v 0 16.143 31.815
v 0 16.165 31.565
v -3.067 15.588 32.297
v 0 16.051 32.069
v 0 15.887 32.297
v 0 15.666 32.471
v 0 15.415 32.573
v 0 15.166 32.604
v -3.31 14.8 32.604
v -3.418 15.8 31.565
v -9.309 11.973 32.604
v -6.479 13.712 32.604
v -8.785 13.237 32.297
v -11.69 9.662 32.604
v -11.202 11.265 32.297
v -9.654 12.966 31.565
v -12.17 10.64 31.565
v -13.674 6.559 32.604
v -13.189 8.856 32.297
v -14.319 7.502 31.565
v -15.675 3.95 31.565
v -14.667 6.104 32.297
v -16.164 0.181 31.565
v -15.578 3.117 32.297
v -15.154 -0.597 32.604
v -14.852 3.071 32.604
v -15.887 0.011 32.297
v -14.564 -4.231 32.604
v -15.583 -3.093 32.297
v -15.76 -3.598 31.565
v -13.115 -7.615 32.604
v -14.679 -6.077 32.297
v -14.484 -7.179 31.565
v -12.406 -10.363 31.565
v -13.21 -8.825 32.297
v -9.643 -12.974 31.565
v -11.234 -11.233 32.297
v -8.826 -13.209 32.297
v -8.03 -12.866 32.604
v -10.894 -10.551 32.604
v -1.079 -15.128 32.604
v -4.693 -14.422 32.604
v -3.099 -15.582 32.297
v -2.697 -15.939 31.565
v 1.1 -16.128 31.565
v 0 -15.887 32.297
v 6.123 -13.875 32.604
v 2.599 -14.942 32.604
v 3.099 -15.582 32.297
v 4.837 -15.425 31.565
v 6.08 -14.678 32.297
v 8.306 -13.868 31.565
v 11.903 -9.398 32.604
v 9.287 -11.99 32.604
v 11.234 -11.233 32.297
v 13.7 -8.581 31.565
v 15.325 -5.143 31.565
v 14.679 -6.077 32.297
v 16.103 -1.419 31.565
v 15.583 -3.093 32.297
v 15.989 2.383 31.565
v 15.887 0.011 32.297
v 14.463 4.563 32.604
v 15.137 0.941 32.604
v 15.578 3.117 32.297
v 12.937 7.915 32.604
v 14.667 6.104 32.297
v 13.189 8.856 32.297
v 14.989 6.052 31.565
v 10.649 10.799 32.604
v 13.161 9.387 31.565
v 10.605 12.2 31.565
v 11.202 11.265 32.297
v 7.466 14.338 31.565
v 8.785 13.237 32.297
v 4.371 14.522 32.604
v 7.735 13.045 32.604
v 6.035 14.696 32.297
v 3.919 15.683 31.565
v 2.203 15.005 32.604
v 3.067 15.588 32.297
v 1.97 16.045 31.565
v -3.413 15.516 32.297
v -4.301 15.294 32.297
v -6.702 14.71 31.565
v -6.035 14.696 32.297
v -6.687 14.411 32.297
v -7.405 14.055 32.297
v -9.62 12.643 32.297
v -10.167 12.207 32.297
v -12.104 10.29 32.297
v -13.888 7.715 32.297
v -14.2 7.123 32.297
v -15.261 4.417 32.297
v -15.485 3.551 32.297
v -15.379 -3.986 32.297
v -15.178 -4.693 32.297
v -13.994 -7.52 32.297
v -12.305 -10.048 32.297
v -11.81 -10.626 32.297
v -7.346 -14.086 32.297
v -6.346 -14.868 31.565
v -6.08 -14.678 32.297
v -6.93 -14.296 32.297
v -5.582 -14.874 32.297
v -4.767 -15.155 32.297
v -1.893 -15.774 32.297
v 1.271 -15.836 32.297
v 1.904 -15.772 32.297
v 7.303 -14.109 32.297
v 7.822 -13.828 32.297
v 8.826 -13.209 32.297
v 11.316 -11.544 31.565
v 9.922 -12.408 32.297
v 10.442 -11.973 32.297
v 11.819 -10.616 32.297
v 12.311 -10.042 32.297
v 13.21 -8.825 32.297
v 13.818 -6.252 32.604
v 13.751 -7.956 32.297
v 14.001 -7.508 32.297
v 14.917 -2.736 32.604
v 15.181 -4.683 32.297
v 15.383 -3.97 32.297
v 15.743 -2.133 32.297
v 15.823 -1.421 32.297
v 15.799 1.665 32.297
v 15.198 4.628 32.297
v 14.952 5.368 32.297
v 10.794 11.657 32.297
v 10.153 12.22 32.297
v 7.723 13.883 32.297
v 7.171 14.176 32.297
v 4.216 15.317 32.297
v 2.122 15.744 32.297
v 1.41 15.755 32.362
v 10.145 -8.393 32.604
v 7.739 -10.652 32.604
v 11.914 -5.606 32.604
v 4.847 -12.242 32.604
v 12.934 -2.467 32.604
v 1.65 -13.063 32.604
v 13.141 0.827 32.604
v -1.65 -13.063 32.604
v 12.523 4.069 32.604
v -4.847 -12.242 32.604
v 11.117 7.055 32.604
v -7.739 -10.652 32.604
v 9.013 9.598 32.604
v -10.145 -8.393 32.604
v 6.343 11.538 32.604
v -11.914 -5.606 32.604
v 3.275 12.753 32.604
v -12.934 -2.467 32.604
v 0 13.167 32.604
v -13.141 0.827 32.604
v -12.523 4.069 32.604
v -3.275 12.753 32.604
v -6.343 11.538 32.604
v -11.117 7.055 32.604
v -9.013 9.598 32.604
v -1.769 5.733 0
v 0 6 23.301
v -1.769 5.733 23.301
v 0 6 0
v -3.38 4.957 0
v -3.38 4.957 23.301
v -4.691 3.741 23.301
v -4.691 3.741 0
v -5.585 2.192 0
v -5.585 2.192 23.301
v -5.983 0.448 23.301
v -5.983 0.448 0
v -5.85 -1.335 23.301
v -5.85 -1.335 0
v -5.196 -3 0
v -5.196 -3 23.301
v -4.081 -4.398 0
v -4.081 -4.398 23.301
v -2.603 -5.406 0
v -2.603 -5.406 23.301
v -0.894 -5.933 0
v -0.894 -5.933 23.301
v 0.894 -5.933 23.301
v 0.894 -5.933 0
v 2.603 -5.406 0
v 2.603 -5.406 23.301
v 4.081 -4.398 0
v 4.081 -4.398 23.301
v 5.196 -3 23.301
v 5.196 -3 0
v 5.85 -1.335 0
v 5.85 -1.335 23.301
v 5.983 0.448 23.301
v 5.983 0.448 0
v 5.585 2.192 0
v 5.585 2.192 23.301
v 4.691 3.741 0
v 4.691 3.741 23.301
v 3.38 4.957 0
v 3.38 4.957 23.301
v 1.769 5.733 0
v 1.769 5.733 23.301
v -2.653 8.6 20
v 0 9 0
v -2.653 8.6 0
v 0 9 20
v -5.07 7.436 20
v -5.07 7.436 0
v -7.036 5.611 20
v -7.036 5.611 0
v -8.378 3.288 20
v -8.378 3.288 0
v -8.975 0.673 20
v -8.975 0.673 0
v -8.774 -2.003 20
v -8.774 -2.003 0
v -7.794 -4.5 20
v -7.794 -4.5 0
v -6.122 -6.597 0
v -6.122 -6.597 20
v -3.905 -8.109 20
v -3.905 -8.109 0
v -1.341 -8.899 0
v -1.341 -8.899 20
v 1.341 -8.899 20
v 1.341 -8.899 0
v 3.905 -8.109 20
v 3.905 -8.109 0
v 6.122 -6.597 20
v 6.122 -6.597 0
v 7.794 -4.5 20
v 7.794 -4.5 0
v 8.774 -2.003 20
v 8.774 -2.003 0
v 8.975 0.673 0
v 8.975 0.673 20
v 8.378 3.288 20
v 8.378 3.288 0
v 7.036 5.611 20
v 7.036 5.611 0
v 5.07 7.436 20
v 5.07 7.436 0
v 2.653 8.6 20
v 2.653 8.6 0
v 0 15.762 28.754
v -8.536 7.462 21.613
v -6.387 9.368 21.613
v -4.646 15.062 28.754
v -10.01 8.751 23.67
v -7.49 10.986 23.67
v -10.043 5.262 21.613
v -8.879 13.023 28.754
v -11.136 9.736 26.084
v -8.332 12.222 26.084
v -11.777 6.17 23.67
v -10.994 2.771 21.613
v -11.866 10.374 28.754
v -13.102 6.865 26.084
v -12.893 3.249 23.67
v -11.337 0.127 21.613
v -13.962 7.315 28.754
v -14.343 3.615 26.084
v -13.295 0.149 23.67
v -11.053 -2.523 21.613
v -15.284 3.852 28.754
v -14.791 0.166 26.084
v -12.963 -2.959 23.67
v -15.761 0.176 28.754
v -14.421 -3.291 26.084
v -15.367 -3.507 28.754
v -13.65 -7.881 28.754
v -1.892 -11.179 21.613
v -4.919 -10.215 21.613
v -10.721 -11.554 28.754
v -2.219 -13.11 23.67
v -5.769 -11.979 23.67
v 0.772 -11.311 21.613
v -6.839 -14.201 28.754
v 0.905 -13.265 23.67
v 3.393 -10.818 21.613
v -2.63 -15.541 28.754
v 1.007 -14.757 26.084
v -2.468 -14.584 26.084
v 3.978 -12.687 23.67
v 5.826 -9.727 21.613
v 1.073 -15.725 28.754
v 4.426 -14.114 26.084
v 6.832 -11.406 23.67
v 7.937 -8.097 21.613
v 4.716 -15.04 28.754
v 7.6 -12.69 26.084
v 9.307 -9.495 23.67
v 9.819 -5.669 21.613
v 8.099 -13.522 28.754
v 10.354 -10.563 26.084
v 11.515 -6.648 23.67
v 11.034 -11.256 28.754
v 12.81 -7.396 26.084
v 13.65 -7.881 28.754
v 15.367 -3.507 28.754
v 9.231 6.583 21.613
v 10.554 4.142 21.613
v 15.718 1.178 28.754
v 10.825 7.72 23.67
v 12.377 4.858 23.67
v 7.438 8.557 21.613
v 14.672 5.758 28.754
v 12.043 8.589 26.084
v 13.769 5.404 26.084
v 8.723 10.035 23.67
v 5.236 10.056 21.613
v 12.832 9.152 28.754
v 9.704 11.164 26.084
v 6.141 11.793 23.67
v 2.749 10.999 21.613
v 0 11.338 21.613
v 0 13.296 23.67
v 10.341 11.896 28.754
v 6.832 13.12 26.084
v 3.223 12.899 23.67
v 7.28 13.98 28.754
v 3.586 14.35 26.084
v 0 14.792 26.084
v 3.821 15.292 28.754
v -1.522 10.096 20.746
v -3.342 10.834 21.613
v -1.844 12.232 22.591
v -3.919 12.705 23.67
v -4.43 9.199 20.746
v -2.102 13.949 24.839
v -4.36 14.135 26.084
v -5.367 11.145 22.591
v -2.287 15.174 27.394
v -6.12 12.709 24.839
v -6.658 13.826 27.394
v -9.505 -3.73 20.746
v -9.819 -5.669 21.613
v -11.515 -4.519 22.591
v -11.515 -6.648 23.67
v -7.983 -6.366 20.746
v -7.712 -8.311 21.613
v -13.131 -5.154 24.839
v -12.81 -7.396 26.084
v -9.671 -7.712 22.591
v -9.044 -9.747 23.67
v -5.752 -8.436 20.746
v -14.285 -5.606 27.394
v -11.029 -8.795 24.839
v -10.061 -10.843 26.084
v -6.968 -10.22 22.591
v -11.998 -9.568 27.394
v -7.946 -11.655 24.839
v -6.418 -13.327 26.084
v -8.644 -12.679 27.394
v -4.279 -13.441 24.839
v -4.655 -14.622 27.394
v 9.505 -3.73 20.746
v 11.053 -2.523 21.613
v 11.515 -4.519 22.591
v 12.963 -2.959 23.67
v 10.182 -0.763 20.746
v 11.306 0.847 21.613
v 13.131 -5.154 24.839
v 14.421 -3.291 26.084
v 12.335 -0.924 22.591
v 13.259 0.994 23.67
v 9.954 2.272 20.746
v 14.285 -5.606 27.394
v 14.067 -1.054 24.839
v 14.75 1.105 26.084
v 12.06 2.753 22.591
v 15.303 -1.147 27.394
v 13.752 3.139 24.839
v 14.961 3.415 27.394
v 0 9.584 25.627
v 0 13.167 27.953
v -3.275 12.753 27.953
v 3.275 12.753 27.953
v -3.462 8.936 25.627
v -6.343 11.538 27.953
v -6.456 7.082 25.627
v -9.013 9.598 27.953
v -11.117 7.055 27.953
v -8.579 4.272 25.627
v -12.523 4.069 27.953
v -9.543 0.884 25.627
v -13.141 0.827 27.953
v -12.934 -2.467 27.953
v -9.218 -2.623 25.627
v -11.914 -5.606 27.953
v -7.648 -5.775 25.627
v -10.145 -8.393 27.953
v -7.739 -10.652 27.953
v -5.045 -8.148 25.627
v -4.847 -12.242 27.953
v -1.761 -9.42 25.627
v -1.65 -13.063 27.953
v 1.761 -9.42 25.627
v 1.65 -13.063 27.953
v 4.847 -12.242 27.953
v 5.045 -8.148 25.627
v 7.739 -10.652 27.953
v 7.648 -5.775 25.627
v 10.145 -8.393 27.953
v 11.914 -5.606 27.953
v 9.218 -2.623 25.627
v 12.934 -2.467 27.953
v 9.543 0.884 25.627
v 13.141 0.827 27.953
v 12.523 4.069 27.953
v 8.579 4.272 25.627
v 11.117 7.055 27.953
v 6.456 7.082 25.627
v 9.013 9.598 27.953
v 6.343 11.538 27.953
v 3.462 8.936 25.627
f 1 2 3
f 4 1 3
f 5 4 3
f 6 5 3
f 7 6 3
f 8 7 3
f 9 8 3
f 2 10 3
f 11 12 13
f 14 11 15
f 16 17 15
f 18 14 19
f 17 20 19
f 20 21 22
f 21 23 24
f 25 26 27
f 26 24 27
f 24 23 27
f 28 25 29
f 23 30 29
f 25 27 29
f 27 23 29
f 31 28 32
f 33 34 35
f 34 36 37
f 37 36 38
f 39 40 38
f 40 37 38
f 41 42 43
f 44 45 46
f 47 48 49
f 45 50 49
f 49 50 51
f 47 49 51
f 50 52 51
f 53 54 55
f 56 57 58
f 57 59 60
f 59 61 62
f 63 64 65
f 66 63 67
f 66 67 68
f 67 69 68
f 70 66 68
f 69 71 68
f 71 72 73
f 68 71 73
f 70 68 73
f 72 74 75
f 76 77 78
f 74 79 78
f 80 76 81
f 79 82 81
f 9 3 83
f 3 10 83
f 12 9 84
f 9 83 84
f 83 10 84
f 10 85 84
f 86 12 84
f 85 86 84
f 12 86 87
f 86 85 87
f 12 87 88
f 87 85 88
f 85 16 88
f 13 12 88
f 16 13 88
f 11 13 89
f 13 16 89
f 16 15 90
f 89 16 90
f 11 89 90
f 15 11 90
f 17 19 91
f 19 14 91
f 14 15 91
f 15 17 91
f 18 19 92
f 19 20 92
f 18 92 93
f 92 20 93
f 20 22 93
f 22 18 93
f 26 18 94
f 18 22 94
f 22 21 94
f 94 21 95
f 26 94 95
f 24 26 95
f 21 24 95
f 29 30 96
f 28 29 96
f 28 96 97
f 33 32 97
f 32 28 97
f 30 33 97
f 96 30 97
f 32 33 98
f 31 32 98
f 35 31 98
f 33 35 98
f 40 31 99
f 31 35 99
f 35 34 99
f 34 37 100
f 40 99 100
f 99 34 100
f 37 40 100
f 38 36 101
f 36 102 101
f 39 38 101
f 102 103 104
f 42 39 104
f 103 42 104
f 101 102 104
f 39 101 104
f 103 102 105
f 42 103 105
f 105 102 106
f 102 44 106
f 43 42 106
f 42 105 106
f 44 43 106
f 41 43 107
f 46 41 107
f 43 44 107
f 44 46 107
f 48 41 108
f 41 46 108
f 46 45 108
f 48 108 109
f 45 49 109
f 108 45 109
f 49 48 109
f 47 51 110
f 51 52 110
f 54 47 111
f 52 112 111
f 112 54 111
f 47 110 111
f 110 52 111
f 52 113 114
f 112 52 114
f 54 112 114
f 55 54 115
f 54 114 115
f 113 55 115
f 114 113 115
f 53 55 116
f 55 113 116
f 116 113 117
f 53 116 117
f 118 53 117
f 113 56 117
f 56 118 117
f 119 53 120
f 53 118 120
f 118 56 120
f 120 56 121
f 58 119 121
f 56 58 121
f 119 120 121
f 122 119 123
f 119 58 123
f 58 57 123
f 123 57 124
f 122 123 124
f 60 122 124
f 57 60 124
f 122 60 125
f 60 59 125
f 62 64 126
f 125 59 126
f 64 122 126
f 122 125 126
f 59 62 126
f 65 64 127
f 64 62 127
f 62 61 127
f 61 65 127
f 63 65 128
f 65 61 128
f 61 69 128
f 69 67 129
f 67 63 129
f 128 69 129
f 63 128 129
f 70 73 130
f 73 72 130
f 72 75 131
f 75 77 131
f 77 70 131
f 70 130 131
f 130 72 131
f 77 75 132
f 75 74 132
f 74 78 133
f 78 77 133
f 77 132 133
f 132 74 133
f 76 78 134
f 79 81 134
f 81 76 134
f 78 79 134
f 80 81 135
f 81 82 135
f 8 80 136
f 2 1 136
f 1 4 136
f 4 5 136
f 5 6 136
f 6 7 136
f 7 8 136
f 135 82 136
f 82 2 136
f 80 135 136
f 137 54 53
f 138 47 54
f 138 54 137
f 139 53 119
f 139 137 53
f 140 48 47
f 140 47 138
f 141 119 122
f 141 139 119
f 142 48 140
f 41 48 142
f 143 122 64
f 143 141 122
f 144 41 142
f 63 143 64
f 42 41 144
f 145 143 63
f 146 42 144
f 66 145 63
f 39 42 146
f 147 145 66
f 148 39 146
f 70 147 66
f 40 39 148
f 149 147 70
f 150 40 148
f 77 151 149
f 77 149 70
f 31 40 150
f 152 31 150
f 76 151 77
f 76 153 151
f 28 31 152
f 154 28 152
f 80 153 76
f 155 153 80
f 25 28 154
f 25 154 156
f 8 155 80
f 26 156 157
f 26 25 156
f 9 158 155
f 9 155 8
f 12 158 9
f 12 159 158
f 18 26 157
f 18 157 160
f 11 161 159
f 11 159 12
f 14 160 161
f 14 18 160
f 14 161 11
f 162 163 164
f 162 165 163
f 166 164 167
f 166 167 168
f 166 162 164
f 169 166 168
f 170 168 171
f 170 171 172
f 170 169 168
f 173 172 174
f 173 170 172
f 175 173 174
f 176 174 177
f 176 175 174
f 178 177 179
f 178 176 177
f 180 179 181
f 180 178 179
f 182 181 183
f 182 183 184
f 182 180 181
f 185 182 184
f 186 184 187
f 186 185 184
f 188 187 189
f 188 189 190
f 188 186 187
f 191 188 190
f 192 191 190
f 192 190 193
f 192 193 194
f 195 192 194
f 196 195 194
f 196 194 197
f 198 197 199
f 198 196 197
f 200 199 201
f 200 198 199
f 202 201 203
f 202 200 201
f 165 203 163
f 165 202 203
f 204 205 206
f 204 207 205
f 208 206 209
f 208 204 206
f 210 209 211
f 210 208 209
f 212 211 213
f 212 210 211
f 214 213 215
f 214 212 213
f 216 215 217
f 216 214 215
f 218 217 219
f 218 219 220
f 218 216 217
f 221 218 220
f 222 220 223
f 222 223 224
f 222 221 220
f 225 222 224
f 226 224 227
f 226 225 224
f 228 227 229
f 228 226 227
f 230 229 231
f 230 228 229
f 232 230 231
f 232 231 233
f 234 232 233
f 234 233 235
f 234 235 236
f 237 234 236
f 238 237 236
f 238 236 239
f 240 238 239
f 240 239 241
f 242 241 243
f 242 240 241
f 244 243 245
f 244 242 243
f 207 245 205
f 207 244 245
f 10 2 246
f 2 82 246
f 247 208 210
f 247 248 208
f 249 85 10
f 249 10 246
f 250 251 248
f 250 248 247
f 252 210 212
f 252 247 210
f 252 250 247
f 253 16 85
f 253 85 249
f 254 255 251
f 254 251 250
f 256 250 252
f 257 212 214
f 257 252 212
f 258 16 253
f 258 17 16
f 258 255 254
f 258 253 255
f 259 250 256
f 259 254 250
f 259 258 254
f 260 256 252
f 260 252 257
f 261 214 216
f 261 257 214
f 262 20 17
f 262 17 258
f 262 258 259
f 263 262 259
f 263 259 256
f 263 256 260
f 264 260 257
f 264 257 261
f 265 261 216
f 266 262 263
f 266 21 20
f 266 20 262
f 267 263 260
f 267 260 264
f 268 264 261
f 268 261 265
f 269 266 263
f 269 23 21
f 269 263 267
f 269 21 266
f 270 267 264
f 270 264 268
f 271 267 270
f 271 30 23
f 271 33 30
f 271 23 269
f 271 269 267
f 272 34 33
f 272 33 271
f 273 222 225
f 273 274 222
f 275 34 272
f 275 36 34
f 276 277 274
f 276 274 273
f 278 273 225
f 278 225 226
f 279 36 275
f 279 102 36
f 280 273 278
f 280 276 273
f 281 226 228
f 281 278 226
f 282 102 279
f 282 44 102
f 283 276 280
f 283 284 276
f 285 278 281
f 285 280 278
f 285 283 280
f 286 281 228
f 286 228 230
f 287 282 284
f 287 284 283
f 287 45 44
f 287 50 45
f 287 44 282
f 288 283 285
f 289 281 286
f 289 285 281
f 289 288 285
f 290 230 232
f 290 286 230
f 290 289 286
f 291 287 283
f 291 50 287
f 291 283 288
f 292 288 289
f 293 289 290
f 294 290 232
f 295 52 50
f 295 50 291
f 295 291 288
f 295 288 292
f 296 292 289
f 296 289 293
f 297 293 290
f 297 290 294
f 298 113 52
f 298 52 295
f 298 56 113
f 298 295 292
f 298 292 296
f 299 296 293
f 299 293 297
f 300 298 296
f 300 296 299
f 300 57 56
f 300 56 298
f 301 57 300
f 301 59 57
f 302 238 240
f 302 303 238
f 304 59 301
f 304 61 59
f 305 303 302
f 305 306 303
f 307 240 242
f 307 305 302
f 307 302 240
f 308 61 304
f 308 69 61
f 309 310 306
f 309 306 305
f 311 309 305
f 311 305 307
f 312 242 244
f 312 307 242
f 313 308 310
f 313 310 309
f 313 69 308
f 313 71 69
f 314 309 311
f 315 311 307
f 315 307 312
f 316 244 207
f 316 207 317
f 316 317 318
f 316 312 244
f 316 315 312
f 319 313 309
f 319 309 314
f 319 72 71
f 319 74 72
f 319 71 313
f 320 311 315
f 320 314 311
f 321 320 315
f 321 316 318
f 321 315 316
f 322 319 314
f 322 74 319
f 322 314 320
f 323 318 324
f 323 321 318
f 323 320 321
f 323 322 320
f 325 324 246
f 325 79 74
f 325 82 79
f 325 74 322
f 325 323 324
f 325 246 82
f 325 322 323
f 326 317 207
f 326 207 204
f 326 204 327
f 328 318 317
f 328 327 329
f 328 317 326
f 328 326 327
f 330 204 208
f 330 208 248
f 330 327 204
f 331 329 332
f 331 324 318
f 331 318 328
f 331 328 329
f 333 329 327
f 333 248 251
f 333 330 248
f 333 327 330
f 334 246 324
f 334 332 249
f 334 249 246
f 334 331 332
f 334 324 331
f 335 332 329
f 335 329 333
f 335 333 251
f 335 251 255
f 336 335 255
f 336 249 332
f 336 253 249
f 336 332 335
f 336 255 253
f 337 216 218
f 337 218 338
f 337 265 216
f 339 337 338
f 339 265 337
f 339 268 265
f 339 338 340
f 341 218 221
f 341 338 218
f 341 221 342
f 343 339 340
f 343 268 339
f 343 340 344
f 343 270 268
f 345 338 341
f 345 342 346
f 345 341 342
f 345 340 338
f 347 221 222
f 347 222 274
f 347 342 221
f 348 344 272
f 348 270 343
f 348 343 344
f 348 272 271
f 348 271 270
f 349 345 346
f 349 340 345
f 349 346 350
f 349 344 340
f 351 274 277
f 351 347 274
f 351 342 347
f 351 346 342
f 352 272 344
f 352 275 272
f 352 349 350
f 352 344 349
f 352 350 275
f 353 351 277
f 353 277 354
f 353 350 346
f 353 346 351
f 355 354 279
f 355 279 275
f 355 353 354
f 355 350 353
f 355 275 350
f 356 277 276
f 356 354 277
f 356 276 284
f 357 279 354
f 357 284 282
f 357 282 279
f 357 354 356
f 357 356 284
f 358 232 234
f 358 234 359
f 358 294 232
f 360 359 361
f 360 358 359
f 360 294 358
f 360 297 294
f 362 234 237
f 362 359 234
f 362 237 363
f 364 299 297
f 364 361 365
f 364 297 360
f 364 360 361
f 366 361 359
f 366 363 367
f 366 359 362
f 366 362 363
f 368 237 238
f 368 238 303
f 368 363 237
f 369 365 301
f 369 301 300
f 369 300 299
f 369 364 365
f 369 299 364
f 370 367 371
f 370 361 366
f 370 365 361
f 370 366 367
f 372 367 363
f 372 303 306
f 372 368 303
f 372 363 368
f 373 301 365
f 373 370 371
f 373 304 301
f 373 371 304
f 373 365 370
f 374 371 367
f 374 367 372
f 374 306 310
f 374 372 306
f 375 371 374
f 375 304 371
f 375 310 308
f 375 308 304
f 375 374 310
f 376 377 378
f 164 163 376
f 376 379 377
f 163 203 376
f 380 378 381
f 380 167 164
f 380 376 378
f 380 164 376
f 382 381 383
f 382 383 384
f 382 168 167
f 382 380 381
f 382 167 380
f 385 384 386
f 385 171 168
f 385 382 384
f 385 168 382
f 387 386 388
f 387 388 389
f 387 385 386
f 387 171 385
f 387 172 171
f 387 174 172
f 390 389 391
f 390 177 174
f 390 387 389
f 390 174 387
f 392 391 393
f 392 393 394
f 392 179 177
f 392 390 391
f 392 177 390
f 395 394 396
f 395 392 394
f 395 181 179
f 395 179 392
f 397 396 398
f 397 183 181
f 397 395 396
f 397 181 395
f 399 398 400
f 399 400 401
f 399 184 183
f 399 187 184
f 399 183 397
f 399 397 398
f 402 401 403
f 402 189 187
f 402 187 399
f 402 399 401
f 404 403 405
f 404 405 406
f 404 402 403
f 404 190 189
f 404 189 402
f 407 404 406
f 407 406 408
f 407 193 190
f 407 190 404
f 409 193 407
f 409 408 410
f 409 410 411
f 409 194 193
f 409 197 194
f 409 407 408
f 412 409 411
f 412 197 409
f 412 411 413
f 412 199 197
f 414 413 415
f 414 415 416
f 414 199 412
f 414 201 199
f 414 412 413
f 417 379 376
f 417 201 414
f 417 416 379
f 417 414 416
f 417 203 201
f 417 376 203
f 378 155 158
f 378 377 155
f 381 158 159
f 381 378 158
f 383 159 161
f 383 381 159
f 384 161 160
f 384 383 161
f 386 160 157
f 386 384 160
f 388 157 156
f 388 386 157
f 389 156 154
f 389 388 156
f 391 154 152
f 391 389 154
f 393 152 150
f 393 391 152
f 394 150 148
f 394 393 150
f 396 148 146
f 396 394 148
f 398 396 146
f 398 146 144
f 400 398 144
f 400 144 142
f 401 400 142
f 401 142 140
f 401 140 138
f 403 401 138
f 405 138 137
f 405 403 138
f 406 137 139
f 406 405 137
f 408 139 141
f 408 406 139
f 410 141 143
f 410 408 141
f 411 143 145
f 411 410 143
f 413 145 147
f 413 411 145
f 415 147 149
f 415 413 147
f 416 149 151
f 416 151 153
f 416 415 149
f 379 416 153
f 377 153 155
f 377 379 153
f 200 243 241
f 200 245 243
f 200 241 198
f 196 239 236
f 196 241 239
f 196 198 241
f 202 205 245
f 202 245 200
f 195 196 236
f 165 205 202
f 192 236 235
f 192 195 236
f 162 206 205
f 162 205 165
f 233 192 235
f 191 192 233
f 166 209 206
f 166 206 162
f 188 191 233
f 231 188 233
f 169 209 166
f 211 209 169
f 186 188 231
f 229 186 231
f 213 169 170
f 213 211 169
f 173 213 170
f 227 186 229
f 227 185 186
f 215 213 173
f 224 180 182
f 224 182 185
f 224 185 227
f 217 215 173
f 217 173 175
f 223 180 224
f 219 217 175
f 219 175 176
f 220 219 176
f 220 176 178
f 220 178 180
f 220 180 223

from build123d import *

# Parameters (mm, degrees)
F2_R = 1


with BuildPart() as f1:
    # F0 (on Right) → F1 (revolve)
    with BuildSketch(Plane.YZ):
        with BuildLine():
            Line((6, 20), (6, 0))
            Line((6, 0), (9, 0))
            Line((9, 0), (9, 20))
            ThreePointArc((9, 20), (14.371488, 25.2855), (16.16702, 32.604342))
            Line((16.16702, 32.604342), (13.16702, 32.604342))
            Line((13.16702, 32.604342), (13.16702, 27.952527))
            Line((13.16702, 27.952527), (6, 23.300707))
            Line((6, 23.300707), (6, 20))
        make_face()
    revolve(axis=Axis((0, 0, 5.74038), (0, 0, 1)))

    # F2
    f2_edges = [f1.edges().sort_by_distance(p)[0] for p in [
        (0, -16.16702, 32.604342),
    ]]
    fillet(f2_edges, radius=F2_R)


solid = f1.part
